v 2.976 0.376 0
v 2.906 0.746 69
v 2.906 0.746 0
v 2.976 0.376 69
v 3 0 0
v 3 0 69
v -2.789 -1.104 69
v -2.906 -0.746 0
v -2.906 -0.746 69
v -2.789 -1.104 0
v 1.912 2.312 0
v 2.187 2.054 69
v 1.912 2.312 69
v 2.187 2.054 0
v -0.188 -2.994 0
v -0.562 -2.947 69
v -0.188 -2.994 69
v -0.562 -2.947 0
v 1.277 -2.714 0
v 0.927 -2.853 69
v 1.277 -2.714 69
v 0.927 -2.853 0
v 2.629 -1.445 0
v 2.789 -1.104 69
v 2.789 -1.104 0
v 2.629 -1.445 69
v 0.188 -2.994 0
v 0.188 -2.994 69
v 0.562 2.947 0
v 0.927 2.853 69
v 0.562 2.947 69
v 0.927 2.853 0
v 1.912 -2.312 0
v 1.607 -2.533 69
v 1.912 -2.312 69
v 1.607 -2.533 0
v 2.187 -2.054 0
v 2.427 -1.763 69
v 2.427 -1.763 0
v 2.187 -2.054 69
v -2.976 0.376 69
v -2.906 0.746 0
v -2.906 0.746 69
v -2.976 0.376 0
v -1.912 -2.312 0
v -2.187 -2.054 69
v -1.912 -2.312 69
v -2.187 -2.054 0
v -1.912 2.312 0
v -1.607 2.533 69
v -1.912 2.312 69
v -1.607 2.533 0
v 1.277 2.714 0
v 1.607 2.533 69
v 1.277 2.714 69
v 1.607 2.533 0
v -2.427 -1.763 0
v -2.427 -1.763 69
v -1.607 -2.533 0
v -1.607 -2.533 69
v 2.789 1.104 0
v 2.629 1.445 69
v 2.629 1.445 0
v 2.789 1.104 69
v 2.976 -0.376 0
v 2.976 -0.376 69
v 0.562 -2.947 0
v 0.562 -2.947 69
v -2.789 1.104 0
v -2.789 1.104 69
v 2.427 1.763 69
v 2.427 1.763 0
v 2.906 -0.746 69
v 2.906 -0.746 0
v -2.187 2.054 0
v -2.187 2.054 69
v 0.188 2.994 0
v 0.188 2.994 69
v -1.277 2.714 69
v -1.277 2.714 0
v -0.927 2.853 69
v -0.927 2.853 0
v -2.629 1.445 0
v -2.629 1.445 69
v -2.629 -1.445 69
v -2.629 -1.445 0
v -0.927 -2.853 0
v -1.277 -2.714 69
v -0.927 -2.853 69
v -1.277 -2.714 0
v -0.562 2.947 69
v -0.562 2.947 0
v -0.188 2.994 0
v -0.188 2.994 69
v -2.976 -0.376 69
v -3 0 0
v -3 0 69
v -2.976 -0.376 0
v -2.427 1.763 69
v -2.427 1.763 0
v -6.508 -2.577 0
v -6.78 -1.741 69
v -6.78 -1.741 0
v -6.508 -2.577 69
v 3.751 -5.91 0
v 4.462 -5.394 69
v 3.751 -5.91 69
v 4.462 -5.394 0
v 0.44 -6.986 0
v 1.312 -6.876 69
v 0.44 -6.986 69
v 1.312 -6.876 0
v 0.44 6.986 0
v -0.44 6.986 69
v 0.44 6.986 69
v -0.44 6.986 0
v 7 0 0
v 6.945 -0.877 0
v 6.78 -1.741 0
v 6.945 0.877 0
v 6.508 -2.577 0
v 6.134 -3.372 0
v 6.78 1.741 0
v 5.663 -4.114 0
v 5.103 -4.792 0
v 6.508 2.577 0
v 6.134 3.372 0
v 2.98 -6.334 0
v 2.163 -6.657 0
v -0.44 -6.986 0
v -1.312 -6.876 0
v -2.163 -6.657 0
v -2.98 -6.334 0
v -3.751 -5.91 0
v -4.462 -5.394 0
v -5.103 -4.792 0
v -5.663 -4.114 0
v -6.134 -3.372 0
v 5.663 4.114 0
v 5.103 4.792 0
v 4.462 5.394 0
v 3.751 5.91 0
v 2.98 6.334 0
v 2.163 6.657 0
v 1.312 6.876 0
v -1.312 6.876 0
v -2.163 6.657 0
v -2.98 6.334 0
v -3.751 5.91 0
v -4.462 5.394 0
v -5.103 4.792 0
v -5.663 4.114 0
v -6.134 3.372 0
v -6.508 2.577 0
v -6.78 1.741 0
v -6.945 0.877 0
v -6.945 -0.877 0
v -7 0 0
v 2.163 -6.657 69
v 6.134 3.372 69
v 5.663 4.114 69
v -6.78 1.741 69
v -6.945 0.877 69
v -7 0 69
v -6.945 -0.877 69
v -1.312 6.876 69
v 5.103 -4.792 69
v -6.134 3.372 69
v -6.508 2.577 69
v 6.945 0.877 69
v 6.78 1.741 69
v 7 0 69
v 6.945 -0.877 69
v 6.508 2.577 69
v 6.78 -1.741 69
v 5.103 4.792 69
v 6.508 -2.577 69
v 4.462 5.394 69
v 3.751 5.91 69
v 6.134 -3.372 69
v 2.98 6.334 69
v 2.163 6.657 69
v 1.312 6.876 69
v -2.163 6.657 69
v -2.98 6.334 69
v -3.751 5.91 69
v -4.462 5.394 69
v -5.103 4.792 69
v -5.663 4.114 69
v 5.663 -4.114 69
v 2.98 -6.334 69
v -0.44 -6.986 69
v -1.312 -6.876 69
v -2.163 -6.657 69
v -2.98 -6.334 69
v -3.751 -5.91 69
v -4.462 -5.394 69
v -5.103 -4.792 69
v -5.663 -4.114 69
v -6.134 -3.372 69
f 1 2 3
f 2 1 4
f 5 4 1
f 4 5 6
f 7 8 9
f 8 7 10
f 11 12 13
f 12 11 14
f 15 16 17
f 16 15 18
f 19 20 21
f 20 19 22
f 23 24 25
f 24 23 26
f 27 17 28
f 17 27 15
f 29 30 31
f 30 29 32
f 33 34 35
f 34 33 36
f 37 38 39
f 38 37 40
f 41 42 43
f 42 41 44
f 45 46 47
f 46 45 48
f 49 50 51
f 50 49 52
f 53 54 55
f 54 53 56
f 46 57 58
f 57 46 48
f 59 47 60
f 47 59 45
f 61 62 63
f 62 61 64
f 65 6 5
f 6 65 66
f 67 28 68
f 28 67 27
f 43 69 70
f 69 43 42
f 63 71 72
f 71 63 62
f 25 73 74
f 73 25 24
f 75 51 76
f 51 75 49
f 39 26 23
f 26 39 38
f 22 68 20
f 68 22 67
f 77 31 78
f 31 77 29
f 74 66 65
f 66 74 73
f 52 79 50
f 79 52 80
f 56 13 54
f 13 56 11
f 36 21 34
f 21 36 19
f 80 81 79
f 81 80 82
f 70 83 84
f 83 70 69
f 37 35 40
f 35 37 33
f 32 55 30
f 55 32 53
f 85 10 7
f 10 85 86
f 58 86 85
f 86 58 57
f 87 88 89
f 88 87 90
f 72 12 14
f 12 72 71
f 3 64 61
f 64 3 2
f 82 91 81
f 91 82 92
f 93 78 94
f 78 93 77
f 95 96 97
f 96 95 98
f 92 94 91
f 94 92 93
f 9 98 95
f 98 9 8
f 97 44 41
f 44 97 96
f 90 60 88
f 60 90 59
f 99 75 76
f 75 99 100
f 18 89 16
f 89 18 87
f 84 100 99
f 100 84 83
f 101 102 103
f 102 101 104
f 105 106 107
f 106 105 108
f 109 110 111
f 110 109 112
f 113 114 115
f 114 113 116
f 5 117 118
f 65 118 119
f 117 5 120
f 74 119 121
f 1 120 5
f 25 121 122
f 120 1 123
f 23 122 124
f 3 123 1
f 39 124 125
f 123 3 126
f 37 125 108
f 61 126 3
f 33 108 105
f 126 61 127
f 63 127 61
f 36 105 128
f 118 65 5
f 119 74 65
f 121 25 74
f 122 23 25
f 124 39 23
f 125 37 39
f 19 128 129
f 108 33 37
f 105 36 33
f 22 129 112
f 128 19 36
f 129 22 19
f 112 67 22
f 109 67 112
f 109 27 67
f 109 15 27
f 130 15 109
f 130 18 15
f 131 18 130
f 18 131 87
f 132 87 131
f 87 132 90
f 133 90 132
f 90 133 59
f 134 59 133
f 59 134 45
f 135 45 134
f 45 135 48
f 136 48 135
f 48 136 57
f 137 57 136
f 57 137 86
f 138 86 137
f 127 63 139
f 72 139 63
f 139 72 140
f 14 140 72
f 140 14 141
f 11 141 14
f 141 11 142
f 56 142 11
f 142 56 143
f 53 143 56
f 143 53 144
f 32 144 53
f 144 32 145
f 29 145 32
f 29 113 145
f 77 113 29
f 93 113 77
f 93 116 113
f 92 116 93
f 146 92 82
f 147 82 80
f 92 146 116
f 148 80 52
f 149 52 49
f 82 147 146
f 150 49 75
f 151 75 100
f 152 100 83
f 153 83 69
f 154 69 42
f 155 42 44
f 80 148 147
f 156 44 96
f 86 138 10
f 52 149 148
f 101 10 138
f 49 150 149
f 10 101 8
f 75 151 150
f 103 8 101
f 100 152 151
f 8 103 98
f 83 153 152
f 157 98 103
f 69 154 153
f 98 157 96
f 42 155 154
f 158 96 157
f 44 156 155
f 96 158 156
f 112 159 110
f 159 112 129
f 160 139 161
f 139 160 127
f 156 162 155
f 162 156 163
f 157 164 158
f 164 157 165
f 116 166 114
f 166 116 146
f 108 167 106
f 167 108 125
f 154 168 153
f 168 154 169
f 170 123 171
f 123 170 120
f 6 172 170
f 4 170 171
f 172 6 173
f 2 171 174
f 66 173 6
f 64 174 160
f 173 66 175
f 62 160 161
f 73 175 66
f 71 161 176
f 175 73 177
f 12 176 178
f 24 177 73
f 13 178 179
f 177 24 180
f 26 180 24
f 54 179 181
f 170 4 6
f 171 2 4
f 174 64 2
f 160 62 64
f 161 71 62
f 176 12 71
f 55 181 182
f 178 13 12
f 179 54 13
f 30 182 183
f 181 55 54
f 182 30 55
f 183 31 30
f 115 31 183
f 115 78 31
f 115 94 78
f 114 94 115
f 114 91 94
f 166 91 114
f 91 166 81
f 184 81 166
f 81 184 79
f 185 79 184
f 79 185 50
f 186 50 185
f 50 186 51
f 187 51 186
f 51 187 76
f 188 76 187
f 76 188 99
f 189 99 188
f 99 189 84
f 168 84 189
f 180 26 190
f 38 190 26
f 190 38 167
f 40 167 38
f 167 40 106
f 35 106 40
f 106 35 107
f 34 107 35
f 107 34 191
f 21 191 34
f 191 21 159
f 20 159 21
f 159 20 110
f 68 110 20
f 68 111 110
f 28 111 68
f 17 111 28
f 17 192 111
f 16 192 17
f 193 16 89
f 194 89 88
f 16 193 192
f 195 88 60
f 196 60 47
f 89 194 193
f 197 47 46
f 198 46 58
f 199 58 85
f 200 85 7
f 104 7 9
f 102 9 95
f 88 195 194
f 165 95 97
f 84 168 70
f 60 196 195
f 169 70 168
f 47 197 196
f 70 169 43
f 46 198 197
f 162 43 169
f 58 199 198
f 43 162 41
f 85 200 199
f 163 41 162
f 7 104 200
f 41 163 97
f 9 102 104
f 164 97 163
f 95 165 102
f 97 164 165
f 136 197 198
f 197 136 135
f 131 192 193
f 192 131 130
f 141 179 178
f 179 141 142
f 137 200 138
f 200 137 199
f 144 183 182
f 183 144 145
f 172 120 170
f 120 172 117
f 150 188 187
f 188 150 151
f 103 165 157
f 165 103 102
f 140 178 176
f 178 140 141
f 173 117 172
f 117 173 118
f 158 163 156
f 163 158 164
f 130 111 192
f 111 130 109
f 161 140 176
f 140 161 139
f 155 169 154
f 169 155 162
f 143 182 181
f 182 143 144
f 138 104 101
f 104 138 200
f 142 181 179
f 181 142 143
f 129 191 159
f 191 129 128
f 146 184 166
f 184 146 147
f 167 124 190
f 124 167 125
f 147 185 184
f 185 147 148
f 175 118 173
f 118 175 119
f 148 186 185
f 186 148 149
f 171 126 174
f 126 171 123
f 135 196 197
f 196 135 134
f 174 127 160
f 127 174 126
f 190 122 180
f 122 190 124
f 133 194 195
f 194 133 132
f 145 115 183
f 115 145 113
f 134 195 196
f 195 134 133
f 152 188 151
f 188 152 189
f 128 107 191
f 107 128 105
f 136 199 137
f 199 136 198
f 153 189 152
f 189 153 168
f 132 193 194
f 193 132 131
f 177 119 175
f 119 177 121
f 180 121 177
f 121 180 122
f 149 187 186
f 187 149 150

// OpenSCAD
$fn = 50;


difference() {
	union() {
		cylinder(h = 69, r = 7.0000000000);
	}
	union() {
		translate(v = [0, 0, -100]) {
			cylinder(h = 200, r = 3.0000000000);
		}
		translate(v = [0, 0, -100]) {
			cylinder(h = 200, r = 1.5000000000);
		}
	}
}
